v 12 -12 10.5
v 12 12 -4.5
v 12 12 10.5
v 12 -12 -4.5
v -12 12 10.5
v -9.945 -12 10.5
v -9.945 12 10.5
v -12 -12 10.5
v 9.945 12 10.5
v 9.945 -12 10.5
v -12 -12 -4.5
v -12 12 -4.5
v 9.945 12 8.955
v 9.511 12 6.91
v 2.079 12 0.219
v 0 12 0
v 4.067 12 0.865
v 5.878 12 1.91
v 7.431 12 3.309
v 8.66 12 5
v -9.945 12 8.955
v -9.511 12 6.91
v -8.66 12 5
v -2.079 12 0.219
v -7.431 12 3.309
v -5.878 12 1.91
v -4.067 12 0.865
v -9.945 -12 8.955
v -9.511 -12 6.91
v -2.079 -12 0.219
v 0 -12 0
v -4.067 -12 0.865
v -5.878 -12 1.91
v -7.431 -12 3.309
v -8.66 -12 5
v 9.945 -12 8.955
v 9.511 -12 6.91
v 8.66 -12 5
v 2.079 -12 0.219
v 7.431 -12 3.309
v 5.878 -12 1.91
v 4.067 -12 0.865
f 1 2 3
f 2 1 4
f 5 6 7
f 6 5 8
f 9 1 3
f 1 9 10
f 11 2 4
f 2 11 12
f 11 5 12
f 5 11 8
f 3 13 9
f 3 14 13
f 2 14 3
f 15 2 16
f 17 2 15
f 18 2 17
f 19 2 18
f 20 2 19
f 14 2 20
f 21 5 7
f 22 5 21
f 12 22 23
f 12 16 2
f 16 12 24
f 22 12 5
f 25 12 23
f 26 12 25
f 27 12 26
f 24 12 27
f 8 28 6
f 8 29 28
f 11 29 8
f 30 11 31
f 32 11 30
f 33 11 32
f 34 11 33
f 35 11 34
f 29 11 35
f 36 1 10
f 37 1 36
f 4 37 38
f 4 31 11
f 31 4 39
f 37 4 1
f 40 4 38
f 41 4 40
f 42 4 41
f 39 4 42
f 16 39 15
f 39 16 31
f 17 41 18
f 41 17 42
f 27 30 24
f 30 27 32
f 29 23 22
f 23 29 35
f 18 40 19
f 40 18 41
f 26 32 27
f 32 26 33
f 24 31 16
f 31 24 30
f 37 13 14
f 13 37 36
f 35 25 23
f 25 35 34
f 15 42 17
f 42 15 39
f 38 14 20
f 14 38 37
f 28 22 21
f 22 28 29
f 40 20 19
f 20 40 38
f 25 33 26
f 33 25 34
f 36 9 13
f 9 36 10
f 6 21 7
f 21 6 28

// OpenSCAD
difference() {
  translate([0, 0, 3]) {
    cube(size=[24, 24, 15], center=true);
  }
  rotate([90, 90, 0]) {
    translate([-10, 0, 0]) {
      cylinder(r=10, h=110, center=true);  
    }
  }
}
